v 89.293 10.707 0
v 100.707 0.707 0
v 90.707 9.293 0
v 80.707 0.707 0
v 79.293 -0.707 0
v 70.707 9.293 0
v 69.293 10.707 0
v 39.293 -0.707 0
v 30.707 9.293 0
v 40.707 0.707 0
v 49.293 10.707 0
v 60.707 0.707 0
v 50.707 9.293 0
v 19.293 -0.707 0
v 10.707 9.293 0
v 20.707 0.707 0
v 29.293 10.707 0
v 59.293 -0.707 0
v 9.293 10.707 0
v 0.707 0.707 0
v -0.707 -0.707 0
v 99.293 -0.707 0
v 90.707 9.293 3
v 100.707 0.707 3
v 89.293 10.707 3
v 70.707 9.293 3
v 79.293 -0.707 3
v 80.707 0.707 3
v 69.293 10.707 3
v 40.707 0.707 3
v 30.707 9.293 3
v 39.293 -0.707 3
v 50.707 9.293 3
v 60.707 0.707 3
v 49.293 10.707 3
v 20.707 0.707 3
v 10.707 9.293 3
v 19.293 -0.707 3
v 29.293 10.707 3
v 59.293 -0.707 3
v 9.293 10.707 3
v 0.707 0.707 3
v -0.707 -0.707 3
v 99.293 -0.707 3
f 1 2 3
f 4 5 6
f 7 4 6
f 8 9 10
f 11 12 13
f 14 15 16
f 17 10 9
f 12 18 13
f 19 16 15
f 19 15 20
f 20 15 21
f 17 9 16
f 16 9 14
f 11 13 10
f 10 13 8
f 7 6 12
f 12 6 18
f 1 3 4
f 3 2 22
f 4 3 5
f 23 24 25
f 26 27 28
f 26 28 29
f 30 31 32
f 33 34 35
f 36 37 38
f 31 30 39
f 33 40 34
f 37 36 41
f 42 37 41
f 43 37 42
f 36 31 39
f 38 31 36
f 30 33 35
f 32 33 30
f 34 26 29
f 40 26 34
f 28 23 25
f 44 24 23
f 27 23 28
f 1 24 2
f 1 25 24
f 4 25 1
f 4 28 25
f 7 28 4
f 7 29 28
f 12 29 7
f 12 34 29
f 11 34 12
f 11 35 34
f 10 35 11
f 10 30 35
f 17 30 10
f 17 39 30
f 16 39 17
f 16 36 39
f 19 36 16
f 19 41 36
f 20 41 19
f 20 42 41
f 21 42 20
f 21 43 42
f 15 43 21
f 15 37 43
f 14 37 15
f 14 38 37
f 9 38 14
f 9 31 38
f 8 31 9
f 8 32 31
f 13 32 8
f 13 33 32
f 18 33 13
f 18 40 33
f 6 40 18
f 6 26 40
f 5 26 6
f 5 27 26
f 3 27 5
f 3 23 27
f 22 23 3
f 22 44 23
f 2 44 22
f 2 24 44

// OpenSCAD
linear_extrude(height = 3.0) {
  polygon(points = [[0.7071067811865475, 0.7071067811865476], [9.292893218813454, 10.707106781186548], [20.70710678118655, 0.7071067811865476], [29.29289321881346, 10.707106781186548], [40.70710678118655, 0.7071067811865476], [49.29289321881346, 10.707106781186548], [60.70710678118656, 0.7071067811865476], [69.29289321881346, 10.707106781186548], [80.70710678118657, 0.7071067811865476], [89.29289321881346, 10.707106781186548], [100.70710678118657, 0.7071067811865476], [99.29289321881346, -0.7071067811865476], [90.70710678118657, 9.292893218813452], [79.29289321881346, -0.7071067811865476], [70.70710678118657, 9.292893218813452], [59.29289321881347, -0.7071067811865476], [50.70710678118655, 9.292893218813452], [39.29289321881346, -0.7071067811865476], [30.707106781186553, 9.292893218813452], [19.292893218813457, -0.7071067811865476], [10.70710678118655, 9.292893218813452], [-0.7071067811865475, -0.7071067811865476]], paths = [[0.0, 1.0, 2.0, 3.0, 4.0, 5.0, 6.0, 7.0, 8.0, 9.0, 10.0, 11.0, 12.0, 13.0, 14.0, 15.0, 16.0, 17.0, 18.0, 19.0, 20.0, 21.0]]);
}
$fn = 50;
